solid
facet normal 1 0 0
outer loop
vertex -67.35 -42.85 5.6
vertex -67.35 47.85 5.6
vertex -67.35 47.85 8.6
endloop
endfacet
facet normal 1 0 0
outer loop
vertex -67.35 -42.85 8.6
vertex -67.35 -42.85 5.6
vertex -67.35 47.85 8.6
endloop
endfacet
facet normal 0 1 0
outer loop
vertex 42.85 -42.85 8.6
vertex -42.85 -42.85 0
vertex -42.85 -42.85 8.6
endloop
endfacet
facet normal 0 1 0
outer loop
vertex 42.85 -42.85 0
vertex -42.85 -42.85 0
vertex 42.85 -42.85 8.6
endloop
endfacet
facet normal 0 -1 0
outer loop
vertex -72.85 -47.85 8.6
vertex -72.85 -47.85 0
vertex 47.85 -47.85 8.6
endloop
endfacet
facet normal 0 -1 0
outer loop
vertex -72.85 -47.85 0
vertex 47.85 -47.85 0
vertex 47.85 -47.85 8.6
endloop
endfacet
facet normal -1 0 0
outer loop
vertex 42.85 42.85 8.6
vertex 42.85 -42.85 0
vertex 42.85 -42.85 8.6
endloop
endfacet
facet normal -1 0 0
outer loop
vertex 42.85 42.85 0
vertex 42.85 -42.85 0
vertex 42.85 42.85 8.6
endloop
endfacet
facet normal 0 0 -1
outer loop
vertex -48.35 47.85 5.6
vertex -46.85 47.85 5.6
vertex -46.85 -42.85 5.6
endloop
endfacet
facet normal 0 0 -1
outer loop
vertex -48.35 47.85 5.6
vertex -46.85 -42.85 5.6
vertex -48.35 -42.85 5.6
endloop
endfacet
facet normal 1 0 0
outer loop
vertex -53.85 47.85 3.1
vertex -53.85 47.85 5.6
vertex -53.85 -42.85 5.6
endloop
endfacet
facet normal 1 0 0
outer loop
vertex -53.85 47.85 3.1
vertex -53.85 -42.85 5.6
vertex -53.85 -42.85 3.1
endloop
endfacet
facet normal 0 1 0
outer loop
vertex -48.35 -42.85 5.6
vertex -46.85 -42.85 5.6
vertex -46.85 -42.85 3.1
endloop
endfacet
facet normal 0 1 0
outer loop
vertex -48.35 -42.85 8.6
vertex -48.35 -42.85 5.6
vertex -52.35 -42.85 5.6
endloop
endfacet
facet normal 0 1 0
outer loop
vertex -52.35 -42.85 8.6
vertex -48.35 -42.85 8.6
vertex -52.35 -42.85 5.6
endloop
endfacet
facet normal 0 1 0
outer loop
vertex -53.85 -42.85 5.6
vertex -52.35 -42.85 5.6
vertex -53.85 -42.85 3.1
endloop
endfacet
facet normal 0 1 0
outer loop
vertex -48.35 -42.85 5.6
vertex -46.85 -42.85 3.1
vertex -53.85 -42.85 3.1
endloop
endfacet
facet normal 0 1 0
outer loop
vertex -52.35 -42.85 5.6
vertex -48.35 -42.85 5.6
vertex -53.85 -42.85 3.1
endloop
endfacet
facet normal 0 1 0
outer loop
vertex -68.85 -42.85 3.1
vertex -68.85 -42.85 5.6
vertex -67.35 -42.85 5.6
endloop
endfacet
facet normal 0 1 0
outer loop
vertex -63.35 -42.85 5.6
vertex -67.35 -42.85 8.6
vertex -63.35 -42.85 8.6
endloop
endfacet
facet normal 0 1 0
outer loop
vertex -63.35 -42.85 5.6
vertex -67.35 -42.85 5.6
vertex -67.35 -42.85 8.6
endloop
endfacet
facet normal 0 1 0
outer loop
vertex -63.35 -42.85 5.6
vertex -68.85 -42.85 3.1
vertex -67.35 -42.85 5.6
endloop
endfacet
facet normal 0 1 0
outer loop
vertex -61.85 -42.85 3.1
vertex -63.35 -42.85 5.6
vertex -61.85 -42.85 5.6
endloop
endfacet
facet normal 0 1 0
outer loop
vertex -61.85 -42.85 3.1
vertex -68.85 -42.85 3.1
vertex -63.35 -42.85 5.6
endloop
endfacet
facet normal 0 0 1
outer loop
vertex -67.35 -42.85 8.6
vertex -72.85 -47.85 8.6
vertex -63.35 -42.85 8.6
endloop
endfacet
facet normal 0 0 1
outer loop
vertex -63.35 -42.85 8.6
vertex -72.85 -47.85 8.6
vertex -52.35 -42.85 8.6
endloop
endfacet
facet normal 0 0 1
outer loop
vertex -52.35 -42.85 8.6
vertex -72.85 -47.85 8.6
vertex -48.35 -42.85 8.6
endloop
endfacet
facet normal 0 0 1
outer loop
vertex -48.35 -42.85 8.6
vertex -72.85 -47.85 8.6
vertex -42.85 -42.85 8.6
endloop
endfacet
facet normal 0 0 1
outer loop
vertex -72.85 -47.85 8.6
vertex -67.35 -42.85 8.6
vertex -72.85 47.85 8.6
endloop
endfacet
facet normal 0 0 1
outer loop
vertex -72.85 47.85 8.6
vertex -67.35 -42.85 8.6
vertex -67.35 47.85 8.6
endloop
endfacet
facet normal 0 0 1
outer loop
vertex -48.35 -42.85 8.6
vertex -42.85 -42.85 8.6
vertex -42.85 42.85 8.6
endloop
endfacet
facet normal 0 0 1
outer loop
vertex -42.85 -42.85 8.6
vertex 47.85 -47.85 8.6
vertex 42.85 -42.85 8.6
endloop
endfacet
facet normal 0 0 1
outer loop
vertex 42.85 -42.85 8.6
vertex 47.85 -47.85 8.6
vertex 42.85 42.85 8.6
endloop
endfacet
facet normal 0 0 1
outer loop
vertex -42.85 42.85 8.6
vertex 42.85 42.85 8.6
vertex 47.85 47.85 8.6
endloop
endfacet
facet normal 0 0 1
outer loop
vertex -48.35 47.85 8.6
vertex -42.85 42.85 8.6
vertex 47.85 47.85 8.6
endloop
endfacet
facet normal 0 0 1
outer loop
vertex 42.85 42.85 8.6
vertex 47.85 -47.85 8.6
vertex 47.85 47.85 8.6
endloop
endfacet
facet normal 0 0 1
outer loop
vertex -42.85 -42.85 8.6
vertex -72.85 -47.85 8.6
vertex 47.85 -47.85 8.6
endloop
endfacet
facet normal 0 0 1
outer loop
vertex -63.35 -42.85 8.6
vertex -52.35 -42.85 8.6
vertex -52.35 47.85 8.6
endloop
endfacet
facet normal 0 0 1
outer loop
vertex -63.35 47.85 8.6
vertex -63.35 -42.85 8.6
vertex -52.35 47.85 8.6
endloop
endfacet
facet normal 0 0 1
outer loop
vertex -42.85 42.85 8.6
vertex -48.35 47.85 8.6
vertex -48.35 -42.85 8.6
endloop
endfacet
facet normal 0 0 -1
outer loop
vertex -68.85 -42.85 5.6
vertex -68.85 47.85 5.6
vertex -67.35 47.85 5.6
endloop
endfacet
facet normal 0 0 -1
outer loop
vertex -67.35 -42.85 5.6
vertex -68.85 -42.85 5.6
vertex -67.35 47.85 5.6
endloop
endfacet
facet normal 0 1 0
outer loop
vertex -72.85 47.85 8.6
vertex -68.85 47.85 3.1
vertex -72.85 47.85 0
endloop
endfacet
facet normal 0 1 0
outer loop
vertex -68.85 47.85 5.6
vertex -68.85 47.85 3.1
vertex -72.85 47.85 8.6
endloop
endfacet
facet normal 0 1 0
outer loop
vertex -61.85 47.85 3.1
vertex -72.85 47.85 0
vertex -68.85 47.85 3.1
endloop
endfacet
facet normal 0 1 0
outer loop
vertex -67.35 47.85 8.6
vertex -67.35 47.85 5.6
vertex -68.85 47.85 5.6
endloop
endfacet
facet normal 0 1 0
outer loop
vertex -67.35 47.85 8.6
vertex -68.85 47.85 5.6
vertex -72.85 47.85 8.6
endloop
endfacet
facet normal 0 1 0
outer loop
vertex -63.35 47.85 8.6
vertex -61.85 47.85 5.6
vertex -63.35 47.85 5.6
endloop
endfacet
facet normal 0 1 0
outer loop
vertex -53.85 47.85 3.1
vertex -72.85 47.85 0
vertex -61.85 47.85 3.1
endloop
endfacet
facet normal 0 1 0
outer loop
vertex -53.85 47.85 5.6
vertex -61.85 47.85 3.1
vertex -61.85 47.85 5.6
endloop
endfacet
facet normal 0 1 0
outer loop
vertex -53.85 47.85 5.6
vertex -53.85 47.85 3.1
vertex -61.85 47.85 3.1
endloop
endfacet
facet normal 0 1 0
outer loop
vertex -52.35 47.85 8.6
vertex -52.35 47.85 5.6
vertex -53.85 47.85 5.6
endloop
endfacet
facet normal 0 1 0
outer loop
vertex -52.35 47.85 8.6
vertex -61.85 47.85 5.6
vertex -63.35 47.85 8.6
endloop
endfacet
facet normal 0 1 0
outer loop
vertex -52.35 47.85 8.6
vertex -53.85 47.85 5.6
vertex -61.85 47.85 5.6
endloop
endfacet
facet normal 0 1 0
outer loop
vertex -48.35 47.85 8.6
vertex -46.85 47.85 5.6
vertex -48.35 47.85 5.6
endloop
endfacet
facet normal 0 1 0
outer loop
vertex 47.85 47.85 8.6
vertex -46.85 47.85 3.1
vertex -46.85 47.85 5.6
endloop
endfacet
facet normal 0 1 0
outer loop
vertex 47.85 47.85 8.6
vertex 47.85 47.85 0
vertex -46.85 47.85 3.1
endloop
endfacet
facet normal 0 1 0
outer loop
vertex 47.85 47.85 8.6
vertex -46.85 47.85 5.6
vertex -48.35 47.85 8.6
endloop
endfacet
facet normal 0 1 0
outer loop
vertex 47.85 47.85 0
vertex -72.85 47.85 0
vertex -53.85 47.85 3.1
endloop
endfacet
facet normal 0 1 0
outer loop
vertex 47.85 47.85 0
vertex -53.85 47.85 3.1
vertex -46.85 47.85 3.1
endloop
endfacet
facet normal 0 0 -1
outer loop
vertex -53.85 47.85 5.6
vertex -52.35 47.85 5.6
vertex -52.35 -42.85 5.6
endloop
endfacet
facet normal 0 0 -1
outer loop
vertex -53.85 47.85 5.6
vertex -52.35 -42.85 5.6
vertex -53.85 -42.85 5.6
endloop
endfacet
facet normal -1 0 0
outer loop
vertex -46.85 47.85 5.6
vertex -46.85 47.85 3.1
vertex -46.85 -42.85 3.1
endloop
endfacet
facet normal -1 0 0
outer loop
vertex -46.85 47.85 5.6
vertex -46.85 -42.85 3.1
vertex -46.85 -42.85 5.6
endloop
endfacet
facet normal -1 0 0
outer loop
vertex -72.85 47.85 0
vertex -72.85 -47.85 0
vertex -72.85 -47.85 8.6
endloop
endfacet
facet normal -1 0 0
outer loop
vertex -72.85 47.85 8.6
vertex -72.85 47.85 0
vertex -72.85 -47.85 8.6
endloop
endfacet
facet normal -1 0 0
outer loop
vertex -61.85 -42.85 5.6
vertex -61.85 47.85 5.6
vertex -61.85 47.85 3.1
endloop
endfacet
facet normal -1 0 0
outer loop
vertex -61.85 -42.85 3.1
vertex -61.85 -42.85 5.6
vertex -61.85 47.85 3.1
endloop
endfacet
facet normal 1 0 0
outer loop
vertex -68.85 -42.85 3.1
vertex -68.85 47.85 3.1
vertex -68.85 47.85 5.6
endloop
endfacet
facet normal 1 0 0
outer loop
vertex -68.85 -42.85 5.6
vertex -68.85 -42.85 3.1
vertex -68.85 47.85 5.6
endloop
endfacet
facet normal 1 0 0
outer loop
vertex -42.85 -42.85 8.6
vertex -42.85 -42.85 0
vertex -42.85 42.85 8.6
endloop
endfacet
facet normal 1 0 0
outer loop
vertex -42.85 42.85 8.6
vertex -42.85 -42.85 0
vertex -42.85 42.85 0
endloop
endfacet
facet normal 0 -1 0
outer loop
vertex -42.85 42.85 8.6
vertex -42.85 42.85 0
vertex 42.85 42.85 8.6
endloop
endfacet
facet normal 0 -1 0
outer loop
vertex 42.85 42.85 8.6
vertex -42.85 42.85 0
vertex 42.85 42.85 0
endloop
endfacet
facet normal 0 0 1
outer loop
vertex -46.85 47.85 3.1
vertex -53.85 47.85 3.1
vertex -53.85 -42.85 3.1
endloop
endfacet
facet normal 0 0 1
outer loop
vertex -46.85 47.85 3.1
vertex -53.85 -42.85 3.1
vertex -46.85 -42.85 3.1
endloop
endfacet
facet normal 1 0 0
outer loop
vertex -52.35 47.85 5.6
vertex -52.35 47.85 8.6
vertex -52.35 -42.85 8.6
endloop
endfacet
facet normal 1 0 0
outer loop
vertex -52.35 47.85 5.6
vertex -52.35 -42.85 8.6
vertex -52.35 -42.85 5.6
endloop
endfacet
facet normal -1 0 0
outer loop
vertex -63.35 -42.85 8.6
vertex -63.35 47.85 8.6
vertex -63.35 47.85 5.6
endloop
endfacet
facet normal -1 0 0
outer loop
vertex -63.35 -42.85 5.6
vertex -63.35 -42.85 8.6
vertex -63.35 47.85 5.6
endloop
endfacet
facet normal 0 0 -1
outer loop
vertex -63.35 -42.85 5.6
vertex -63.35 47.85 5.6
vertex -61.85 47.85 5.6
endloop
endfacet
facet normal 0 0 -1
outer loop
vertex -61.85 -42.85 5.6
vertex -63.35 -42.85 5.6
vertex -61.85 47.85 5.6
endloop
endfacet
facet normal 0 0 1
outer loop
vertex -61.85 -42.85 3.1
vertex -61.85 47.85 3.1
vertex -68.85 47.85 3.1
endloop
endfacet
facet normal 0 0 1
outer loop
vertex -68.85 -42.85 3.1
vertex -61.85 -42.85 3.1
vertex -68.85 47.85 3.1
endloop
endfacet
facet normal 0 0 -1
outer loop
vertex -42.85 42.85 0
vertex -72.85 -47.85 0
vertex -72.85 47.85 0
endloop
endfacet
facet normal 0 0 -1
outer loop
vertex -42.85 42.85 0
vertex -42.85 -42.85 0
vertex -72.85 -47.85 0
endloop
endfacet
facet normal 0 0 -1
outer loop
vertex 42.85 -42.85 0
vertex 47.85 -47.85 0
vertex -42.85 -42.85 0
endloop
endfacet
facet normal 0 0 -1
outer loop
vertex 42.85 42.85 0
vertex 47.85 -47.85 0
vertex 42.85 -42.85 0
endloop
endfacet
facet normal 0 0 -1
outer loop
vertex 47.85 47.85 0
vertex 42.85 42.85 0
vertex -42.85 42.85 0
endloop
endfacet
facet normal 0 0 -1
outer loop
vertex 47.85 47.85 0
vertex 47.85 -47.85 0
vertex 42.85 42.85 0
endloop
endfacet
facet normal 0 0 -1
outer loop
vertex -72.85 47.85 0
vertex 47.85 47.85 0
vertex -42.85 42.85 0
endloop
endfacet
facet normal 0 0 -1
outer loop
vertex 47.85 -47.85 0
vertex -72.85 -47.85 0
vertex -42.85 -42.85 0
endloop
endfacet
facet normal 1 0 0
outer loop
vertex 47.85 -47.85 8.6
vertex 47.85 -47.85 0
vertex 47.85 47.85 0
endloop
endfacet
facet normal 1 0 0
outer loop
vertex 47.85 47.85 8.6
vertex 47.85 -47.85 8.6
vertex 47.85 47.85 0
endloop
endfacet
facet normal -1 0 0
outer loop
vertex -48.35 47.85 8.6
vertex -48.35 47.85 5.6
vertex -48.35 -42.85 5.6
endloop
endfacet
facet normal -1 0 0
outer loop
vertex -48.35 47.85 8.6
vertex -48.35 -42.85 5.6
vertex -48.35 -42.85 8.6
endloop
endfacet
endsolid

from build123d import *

# Parameters (mm, degrees)
SKETCH_1_W          = 95.7
SKETCH_1_H          = 95.7
SKETCH_1_W_2        = 85.7
SKETCH_1_H_2        = 85.7
EXTRUDE_1_DEPTH     = 8.6
SKETCH_2_W          = 8.6
SKETCH_2_H          = 95.7
EXTRUDE_2_DEPTH     = 25
CUT_EXTRUDE_2_DEPTH = 90.7


with BuildPart() as part:
    # 草图1 → 凸台-拉伸1 (new body)
    with BuildSketch(Plane.XY):
        Rectangle(SKETCH_1_W, SKETCH_1_H)
        Rectangle(SKETCH_1_W_2, SKETCH_1_H_2, mode=Mode.SUBTRACT)
    extrude(amount=EXTRUDE_1_DEPTH)

    # 草图2 → 凸台-拉伸2 (add)
    with BuildSketch(Plane.ZY.offset(47.85)):
        with Locations((4.3, 0)):
            Rectangle(SKETCH_2_W, SKETCH_2_H)
    extrude(amount=EXTRUDE_2_DEPTH)

    # 草图5 → 切除-拉伸2 (cut)
    with BuildSketch(Plane(origin=(0, 47.85, 0), x_dir=(1, 0, 0), z_dir=(0, 1, 0))):
        Polygon((-67.35, -8.6), (-63.35, -8.6), (-63.35, -5.6), (-61.85, -5.6), (-61.85, -3.1), (-68.85, -3.1), (-68.85, -5.6), (-67.35, -5.6), align=None)
        Polygon((-53.85, -5.6), (-53.85, -3.1), (-46.85, -3.1), (-46.85, -5.6), (-48.35, -5.6), (-48.35, -8.6), (-52.35, -8.6), (-52.35, -5.6), align=None)
    extrude(amount=-CUT_EXTRUDE_2_DEPTH, mode=Mode.SUBTRACT)


solid = part.part
